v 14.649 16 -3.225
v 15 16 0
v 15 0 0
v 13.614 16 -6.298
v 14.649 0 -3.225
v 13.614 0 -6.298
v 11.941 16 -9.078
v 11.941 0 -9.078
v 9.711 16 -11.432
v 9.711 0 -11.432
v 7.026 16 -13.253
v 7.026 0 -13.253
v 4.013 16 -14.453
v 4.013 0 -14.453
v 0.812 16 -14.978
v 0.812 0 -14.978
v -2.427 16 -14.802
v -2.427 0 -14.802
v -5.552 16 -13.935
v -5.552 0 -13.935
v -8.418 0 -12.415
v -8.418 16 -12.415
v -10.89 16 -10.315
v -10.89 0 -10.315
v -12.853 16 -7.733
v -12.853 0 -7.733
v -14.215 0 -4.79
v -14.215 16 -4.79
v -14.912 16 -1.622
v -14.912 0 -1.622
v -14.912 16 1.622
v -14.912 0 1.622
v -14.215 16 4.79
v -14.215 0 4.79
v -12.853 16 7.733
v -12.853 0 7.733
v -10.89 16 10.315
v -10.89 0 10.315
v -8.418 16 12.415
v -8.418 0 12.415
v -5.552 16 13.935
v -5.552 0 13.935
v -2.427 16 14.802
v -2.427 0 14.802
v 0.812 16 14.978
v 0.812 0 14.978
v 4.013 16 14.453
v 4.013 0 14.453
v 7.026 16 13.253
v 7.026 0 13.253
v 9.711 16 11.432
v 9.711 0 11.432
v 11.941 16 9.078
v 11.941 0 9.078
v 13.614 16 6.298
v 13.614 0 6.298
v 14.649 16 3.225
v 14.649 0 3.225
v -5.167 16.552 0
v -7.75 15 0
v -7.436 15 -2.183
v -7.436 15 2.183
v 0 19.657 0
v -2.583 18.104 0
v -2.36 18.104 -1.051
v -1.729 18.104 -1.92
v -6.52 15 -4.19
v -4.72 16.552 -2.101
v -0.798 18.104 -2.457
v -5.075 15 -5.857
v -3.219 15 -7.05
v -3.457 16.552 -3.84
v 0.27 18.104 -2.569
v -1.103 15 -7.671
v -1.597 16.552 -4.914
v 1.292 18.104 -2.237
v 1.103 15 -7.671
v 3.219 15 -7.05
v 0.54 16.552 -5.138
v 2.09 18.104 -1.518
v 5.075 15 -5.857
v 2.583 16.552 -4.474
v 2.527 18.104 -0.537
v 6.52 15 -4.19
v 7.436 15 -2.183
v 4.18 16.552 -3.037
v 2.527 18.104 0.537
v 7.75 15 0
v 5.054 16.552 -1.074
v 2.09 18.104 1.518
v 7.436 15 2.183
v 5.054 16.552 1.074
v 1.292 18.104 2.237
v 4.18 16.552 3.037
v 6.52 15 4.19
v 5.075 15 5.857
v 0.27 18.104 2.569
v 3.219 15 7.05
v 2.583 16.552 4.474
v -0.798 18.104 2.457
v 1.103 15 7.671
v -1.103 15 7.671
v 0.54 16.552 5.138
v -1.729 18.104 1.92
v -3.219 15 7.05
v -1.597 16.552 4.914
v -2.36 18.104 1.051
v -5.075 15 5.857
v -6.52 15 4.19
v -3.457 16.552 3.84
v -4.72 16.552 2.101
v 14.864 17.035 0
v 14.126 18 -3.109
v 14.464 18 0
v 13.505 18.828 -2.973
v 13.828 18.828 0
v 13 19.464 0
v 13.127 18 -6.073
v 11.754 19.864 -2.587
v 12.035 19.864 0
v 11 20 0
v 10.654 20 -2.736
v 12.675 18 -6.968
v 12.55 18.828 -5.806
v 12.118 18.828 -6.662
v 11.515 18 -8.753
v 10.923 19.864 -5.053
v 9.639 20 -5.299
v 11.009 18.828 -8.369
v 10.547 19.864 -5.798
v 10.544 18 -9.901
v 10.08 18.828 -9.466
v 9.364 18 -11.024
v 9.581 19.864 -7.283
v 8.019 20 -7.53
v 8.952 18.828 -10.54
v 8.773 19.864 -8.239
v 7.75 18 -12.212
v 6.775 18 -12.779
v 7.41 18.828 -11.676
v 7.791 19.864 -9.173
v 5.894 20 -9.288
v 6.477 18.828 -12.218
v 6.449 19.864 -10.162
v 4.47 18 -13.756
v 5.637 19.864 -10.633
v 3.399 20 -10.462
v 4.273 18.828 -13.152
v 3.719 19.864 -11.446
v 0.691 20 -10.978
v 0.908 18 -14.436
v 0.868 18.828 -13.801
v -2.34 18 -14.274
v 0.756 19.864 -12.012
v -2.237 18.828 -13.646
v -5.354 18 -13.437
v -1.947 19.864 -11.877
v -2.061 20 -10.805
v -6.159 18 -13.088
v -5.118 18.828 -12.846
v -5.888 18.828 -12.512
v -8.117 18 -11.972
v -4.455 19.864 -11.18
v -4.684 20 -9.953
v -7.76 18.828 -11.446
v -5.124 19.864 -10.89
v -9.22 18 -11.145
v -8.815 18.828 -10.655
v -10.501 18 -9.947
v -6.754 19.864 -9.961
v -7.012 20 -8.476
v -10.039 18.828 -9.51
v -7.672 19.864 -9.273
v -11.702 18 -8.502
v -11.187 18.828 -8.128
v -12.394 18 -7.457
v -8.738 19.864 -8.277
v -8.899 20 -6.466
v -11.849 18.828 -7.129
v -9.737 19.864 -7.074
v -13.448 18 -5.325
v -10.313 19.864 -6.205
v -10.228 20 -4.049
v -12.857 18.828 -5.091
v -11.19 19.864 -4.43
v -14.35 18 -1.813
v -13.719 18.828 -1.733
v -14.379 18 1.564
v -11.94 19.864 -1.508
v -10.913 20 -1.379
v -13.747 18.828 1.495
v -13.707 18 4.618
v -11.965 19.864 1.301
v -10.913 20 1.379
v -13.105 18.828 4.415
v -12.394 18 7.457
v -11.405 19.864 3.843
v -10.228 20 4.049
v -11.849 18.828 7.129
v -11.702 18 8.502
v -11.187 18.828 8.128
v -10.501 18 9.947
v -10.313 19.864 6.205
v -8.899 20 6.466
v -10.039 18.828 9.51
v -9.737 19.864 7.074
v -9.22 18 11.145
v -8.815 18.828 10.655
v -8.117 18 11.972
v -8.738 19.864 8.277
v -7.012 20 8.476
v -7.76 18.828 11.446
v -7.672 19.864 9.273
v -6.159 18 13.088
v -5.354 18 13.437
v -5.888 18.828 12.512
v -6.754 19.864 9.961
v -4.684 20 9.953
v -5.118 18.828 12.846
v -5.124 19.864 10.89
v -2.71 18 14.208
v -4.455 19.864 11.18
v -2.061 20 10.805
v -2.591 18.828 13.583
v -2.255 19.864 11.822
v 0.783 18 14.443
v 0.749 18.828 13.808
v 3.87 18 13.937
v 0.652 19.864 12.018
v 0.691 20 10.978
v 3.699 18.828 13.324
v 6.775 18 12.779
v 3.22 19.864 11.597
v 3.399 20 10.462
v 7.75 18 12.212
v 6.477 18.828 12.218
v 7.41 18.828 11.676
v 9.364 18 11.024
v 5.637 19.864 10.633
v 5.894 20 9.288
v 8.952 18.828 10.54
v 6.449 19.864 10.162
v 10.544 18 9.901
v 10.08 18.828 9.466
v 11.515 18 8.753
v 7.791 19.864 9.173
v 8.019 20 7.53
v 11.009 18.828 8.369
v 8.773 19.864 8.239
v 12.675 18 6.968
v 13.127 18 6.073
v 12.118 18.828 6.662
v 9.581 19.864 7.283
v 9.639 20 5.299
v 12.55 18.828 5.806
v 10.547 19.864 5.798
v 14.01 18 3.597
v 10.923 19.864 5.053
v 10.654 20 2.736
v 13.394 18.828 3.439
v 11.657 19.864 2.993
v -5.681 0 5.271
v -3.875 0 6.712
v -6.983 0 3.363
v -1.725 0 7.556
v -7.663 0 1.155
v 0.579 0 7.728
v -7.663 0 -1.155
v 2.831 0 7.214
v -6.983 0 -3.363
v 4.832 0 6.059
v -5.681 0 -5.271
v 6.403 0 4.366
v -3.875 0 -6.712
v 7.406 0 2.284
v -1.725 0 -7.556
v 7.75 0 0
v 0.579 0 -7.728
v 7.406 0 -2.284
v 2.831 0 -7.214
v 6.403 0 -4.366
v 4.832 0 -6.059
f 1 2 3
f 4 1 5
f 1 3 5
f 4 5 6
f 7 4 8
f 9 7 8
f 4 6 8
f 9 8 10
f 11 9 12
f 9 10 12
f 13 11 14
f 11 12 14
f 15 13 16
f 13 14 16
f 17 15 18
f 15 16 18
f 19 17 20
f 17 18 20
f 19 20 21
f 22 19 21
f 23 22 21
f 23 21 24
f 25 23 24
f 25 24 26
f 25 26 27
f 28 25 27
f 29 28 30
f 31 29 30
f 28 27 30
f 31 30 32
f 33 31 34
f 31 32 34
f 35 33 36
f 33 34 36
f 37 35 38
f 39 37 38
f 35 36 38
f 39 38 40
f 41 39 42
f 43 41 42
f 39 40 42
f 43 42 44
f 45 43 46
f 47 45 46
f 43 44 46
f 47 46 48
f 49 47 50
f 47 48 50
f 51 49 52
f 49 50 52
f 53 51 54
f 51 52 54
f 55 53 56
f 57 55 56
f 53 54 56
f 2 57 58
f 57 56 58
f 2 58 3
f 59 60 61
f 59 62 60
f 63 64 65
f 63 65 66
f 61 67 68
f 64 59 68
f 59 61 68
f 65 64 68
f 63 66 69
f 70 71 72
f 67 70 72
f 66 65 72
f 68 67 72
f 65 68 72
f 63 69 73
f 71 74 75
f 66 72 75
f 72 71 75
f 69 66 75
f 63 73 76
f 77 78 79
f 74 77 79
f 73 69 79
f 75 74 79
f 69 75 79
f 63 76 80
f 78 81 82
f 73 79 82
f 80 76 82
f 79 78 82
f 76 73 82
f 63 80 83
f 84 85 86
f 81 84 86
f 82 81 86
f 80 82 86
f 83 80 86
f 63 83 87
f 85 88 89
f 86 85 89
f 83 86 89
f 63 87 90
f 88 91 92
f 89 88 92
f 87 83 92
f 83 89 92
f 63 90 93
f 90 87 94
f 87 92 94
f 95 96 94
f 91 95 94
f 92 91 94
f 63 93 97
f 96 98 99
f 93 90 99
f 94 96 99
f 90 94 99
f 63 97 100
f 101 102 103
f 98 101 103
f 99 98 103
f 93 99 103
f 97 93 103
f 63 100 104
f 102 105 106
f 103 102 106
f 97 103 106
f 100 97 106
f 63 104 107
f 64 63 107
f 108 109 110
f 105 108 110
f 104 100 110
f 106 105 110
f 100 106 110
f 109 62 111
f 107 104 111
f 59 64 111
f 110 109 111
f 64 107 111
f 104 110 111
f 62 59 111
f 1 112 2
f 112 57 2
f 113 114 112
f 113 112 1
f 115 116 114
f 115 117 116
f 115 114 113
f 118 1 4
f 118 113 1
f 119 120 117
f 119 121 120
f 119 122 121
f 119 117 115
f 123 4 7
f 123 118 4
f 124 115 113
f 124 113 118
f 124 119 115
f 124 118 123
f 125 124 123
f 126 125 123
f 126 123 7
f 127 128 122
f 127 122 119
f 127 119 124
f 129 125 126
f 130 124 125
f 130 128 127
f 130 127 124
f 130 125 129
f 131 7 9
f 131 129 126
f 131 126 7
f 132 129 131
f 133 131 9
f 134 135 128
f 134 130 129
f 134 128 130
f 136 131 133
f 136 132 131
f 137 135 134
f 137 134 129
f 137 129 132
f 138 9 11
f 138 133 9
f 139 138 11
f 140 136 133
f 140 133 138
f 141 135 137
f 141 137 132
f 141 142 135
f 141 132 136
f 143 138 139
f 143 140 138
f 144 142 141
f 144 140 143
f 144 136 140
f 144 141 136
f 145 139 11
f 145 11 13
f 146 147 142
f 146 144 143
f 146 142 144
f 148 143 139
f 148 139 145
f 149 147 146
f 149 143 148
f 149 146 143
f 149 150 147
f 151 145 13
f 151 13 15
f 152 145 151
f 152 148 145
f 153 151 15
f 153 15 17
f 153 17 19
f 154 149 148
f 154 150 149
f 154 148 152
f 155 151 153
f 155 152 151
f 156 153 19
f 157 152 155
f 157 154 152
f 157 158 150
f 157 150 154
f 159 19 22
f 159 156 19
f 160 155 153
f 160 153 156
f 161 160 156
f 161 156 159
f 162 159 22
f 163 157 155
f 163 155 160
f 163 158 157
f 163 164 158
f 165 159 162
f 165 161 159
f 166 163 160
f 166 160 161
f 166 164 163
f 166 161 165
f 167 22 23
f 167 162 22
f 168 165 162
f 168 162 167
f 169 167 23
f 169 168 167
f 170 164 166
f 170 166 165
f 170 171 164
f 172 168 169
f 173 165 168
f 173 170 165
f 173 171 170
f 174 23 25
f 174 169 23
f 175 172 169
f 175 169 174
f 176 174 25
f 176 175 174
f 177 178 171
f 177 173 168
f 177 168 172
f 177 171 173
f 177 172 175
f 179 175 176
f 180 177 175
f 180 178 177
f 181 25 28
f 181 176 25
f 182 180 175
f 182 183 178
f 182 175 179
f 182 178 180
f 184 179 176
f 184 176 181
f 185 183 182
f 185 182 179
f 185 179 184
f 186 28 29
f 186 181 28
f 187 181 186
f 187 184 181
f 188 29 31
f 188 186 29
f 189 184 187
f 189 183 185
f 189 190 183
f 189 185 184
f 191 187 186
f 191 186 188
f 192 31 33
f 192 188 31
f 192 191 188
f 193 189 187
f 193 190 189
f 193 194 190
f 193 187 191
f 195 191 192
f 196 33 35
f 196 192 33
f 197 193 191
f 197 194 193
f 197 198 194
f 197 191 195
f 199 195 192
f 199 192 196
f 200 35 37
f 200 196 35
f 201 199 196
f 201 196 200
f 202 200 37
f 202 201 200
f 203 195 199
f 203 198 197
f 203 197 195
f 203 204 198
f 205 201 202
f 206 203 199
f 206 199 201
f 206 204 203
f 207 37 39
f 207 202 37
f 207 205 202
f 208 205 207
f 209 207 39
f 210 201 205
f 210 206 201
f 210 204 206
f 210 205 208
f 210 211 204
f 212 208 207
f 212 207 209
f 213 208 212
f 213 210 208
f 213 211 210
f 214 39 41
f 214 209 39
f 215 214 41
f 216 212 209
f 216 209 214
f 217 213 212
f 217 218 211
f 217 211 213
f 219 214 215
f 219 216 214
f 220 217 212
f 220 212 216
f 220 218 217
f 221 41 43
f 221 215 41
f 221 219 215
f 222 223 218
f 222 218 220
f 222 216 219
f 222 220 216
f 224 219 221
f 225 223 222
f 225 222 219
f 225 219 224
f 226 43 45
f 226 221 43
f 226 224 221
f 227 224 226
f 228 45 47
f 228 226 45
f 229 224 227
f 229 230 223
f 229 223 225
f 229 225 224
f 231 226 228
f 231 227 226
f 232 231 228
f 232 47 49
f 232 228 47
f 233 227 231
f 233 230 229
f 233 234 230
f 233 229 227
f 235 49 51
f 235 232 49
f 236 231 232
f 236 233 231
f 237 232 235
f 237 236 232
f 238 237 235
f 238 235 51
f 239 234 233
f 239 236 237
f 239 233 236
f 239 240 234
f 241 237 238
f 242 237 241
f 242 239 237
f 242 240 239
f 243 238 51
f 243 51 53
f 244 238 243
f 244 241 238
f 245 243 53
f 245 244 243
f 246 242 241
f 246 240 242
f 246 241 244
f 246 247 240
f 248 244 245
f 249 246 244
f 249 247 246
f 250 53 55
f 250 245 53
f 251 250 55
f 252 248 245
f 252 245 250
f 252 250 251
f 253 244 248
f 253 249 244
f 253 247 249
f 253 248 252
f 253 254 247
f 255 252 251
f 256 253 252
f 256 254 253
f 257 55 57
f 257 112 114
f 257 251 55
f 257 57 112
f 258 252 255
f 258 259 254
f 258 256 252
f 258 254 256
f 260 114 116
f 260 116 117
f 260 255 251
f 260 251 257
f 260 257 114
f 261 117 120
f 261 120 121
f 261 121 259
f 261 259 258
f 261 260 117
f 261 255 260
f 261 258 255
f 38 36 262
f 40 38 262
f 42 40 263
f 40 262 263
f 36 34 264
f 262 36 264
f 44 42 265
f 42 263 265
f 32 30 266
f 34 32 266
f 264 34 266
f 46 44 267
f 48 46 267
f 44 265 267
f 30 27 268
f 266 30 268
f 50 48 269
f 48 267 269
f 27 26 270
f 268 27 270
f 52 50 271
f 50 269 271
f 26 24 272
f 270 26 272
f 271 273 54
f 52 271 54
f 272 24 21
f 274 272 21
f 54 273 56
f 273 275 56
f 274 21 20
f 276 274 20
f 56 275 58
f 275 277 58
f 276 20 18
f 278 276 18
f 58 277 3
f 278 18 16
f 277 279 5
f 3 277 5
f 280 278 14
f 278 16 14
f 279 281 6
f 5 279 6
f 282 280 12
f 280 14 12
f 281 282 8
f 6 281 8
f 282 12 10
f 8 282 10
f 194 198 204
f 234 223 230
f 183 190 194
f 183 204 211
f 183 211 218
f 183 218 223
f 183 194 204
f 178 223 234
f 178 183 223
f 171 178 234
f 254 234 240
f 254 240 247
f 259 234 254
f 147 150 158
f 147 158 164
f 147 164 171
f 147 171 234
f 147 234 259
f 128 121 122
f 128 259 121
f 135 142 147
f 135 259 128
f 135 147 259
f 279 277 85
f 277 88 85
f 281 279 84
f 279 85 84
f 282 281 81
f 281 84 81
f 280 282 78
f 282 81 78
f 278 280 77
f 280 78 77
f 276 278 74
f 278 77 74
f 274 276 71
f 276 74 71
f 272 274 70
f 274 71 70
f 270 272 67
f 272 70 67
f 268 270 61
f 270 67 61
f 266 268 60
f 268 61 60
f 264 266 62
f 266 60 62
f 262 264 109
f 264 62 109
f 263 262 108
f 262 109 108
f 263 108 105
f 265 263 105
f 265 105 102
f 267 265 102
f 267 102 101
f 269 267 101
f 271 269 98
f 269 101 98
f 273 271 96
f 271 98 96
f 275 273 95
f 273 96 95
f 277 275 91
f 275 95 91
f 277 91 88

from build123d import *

# Parameters (mm, degrees)
SKETCH2_R                        = 15
BOSS_EXTRUDE1_DEPTH              = 20
TAP_DRILL_FOR_M18X2_5_TAP1_D     = 15.5
TAP_DRILL_FOR_M18X2_5_TAP1_DEPTH = 15
TAP_DRILL_FOR_M18X2_5_TAP1_TIP   = 4.656669797
FILLET1_R                        = 4


with BuildPart() as part:
    # Sketch2 → Boss-Extrude1 (new body)
    with BuildSketch(Plane(origin=(0, 0, 0), x_dir=(1, 0, 0), z_dir=(0, 1, 0))):
        Circle(SKETCH2_R)
    extrude(amount=BOSS_EXTRUDE1_DEPTH)

    # Tap Drill for M18x2.5 Tap1
    with Locations(Plane(origin=(0, 0, 0), x_dir=(-1, 0, 0), z_dir=(0, -1, 0))):
        with Locations((0, 0)):
            Hole(TAP_DRILL_FOR_M18X2_5_TAP1_D / 2, depth=TAP_DRILL_FOR_M18X2_5_TAP1_DEPTH)
            with Locations((0, 0, -(TAP_DRILL_FOR_M18X2_5_TAP1_DEPTH + TAP_DRILL_FOR_M18X2_5_TAP1_TIP / 2))):  # 118° drill point
                Cone(0, TAP_DRILL_FOR_M18X2_5_TAP1_D / 2, TAP_DRILL_FOR_M18X2_5_TAP1_TIP, mode=Mode.SUBTRACT)

    # Fillet1
    fillet1_edges = [part.edges().sort_by_distance(p)[0] for p in [
        (-15, 20, 0),
    ]]
    fillet(fillet1_edges, radius=FILLET1_R)


solid = part.part
